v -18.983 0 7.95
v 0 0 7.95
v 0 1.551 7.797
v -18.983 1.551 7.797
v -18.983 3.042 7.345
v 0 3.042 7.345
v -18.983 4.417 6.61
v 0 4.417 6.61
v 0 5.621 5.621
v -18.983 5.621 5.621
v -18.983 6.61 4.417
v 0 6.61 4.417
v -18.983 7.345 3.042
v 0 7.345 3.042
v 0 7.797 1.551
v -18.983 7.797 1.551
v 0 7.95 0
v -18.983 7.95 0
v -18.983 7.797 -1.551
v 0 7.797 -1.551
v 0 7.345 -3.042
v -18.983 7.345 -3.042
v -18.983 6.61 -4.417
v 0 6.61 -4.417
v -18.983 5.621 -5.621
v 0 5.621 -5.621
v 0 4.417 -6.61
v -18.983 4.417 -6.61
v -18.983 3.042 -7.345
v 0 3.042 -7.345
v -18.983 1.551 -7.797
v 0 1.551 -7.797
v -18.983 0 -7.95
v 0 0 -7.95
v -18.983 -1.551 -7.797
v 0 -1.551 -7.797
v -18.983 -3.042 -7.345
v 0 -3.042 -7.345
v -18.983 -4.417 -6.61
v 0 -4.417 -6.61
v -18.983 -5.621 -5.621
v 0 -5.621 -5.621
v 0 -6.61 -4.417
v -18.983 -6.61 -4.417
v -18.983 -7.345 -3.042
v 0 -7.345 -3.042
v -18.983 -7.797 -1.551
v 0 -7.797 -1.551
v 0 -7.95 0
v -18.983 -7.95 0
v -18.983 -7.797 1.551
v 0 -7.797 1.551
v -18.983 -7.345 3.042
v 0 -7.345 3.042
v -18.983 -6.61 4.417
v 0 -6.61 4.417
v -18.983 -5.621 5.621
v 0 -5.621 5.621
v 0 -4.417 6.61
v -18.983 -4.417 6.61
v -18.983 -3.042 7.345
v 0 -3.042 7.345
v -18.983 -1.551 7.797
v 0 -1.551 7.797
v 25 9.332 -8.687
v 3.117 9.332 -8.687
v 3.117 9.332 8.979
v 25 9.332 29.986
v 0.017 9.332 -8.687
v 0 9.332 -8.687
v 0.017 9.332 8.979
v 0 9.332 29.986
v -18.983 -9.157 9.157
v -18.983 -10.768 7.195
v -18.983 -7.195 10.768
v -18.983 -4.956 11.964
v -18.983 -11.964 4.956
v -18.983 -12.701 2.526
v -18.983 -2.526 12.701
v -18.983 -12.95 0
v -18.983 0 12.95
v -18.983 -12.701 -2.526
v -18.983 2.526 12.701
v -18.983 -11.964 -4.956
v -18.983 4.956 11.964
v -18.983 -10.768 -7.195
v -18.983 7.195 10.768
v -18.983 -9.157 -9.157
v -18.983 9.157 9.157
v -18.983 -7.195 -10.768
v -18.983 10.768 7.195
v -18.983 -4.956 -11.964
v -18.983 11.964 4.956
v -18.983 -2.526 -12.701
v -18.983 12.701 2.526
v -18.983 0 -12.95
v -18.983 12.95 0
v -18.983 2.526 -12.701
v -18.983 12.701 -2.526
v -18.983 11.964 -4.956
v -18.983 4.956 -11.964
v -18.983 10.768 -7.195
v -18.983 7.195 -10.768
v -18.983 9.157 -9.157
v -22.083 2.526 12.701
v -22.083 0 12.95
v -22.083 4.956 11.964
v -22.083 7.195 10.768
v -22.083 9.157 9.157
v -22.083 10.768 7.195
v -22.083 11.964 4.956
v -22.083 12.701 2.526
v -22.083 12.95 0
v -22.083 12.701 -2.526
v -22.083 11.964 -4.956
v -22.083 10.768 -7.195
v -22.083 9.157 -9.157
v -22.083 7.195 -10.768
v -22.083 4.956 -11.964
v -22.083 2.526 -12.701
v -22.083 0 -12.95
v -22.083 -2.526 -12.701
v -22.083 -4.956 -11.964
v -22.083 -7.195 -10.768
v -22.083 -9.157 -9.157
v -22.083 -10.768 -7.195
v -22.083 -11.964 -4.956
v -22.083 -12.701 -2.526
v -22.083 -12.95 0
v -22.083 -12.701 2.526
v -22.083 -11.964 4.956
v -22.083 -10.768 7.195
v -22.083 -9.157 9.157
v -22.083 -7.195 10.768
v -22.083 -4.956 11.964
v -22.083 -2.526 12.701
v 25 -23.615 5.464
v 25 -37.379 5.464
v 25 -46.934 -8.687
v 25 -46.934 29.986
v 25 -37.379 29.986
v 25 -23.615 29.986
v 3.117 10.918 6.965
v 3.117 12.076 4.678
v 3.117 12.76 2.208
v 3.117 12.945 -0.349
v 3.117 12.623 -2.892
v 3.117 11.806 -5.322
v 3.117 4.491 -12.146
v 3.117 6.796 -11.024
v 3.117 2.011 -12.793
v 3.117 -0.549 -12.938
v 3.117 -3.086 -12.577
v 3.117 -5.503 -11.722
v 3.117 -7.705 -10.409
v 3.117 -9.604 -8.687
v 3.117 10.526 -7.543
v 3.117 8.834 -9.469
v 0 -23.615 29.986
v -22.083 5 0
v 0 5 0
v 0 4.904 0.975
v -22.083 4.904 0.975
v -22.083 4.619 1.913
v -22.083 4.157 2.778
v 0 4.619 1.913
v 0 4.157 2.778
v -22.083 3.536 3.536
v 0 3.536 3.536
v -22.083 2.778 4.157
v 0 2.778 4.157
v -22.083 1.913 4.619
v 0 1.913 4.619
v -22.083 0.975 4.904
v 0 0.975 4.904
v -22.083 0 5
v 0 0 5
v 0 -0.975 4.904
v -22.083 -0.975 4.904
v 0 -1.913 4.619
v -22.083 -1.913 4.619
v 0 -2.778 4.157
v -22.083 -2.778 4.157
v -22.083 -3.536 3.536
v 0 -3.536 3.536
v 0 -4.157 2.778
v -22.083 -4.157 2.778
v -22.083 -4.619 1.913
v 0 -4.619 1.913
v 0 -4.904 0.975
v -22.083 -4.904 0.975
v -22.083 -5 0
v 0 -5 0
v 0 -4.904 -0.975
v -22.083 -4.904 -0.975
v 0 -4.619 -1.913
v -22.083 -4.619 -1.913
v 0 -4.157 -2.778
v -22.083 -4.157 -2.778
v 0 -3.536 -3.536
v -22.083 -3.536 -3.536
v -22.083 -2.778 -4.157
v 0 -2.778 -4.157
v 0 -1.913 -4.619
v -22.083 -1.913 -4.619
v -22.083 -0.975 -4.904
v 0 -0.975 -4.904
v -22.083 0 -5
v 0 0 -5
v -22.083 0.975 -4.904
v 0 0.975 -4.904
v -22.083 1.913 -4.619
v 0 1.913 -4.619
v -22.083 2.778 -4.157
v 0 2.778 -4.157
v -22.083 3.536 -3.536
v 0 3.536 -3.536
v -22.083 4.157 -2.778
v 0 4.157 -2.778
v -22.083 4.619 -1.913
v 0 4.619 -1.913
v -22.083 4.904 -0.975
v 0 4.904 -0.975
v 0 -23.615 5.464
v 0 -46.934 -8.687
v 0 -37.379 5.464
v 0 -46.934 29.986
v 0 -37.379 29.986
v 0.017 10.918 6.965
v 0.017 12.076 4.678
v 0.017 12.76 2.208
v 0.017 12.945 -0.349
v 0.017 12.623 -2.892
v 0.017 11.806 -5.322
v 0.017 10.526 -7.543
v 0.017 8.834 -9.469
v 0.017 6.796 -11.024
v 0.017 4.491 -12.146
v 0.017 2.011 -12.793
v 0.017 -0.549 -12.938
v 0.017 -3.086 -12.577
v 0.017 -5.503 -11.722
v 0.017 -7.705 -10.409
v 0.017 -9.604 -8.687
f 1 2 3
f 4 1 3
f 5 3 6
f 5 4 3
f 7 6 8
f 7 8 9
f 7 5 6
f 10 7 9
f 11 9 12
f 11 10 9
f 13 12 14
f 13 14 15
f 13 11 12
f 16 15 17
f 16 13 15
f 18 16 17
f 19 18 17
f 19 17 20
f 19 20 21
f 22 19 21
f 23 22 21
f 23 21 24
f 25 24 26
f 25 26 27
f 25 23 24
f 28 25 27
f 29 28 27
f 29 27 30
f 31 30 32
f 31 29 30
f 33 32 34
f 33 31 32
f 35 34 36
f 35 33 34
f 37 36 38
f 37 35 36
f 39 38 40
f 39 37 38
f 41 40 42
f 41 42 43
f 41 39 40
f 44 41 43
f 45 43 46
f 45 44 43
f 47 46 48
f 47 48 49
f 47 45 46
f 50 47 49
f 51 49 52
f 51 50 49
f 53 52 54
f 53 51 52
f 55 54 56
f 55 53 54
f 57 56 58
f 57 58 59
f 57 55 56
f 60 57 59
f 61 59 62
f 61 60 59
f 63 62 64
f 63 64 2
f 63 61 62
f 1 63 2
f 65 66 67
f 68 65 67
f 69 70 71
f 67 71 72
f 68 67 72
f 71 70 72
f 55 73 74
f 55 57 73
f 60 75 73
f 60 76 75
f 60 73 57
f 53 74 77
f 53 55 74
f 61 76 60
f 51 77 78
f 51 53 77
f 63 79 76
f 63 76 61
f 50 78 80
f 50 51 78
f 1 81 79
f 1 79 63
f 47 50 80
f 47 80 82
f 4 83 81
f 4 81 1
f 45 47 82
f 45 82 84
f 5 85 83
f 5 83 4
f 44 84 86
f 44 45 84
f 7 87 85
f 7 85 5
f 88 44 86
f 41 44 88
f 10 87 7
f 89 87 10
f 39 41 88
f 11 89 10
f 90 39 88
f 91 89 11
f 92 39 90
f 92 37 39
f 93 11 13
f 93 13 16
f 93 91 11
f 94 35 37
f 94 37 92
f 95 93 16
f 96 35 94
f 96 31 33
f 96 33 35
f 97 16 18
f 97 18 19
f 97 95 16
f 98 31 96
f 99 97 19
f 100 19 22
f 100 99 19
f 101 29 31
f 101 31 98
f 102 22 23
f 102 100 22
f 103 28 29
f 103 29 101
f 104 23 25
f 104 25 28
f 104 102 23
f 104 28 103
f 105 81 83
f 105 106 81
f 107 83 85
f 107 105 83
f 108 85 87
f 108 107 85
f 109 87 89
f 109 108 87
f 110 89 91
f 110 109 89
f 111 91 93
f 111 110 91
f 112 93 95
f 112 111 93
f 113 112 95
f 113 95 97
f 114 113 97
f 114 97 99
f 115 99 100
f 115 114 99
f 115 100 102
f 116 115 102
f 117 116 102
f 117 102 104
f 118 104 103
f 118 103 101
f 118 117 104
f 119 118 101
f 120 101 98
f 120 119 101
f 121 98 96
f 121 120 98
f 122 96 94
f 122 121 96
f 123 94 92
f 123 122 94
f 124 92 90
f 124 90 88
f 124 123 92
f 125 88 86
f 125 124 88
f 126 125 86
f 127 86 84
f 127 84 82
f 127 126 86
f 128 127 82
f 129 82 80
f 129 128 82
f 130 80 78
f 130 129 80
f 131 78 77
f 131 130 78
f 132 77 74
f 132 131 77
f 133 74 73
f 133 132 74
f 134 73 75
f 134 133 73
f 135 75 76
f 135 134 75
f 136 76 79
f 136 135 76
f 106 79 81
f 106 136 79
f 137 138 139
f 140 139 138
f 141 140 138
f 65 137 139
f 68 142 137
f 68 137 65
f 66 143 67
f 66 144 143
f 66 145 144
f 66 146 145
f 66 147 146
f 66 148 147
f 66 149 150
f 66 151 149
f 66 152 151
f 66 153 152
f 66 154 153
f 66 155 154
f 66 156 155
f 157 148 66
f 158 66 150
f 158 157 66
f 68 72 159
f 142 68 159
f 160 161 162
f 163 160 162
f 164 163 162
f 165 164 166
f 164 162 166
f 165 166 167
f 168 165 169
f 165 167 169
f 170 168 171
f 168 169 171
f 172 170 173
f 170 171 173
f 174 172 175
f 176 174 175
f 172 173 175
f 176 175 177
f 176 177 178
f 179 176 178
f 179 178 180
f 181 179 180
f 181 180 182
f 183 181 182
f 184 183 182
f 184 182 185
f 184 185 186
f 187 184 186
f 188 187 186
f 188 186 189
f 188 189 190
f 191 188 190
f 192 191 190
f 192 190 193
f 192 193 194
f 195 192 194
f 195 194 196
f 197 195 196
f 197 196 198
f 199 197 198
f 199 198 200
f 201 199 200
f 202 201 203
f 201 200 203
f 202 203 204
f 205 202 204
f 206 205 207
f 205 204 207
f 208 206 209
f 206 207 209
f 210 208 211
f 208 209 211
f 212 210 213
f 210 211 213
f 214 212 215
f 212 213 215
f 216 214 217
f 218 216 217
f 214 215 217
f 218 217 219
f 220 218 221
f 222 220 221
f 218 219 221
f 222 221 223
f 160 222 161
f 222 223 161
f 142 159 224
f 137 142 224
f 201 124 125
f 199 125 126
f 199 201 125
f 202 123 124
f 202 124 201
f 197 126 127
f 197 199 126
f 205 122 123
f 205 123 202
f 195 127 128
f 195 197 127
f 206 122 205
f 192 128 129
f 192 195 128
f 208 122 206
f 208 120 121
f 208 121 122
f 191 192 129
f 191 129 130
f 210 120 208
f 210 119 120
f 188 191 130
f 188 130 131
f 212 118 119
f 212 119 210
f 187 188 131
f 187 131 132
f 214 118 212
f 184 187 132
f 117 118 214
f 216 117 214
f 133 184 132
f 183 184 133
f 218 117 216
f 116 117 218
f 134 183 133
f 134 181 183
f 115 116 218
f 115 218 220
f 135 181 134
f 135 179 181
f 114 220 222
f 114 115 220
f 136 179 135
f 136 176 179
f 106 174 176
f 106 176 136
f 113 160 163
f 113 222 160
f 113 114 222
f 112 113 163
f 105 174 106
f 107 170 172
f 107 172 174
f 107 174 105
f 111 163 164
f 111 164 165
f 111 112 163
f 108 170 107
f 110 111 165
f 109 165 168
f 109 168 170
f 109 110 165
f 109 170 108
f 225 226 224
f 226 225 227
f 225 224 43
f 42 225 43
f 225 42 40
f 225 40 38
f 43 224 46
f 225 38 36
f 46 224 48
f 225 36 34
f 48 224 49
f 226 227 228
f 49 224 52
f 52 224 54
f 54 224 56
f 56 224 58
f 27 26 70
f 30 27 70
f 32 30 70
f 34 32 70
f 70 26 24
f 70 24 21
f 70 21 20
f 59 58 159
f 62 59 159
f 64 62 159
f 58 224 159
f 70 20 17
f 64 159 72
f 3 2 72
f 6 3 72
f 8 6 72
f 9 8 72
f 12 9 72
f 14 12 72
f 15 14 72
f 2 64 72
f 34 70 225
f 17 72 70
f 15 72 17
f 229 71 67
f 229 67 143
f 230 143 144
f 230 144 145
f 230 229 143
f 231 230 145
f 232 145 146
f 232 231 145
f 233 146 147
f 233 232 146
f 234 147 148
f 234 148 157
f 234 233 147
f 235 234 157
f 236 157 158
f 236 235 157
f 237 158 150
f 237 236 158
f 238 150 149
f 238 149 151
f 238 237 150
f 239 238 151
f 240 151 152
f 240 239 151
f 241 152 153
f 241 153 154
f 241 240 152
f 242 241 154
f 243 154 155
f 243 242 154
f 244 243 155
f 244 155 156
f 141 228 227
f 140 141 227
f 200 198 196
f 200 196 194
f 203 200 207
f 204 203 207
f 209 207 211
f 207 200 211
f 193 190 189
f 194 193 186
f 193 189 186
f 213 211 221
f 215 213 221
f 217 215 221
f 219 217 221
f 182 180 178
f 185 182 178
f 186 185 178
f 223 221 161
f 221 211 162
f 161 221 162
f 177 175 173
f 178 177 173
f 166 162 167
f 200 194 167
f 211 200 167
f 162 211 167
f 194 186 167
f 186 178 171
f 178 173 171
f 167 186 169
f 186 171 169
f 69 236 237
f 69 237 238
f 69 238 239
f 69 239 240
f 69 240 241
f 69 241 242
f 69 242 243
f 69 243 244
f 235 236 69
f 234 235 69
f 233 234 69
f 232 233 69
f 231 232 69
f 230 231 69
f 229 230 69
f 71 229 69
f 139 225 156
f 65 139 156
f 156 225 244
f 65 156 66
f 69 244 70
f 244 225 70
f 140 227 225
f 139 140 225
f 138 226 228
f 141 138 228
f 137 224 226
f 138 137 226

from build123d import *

# Parameters (mm, degrees)
F2_R     = 5
F3_DEPTH = 30
F5_DEPTH = 25


with BuildPart() as f1:
    # F0 (on Front) → F1 (revolve)
    with BuildSketch(Plane.XZ):
        Polygon((-22.083245, 12.95), (-22.083245, 0), (3.116755, 0), (3.116755, 12.95), (0.016755, 12.95), (0.016755, 7.95), (-18.983245, 7.95), (-18.983245, 12.95), align=None)
    revolve(axis=Axis((-7.986653, 0, 0), (-1, 0, 0)))

    # F2 (on face) → F3 (cut)
    with BuildSketch(Plane.YZ.offset(3.116755)):
        Circle(F2_R)
    extrude(amount=-F3_DEPTH, mode=Mode.SUBTRACT)

    # F4 (on Right) → F5 (join)
    with BuildSketch(Plane.YZ):
        Polygon((-37.379272, 29.986372), (-46.934061, 29.986372), (-46.934061, -8.687175), (9.331752, -8.687175), (9.331752, 29.986372), (-23.615412, 29.986372), (-23.615412, 5.463502), (-37.379272, 5.463502), align=None)
    extrude(amount=F5_DEPTH)


solid = f1.part
